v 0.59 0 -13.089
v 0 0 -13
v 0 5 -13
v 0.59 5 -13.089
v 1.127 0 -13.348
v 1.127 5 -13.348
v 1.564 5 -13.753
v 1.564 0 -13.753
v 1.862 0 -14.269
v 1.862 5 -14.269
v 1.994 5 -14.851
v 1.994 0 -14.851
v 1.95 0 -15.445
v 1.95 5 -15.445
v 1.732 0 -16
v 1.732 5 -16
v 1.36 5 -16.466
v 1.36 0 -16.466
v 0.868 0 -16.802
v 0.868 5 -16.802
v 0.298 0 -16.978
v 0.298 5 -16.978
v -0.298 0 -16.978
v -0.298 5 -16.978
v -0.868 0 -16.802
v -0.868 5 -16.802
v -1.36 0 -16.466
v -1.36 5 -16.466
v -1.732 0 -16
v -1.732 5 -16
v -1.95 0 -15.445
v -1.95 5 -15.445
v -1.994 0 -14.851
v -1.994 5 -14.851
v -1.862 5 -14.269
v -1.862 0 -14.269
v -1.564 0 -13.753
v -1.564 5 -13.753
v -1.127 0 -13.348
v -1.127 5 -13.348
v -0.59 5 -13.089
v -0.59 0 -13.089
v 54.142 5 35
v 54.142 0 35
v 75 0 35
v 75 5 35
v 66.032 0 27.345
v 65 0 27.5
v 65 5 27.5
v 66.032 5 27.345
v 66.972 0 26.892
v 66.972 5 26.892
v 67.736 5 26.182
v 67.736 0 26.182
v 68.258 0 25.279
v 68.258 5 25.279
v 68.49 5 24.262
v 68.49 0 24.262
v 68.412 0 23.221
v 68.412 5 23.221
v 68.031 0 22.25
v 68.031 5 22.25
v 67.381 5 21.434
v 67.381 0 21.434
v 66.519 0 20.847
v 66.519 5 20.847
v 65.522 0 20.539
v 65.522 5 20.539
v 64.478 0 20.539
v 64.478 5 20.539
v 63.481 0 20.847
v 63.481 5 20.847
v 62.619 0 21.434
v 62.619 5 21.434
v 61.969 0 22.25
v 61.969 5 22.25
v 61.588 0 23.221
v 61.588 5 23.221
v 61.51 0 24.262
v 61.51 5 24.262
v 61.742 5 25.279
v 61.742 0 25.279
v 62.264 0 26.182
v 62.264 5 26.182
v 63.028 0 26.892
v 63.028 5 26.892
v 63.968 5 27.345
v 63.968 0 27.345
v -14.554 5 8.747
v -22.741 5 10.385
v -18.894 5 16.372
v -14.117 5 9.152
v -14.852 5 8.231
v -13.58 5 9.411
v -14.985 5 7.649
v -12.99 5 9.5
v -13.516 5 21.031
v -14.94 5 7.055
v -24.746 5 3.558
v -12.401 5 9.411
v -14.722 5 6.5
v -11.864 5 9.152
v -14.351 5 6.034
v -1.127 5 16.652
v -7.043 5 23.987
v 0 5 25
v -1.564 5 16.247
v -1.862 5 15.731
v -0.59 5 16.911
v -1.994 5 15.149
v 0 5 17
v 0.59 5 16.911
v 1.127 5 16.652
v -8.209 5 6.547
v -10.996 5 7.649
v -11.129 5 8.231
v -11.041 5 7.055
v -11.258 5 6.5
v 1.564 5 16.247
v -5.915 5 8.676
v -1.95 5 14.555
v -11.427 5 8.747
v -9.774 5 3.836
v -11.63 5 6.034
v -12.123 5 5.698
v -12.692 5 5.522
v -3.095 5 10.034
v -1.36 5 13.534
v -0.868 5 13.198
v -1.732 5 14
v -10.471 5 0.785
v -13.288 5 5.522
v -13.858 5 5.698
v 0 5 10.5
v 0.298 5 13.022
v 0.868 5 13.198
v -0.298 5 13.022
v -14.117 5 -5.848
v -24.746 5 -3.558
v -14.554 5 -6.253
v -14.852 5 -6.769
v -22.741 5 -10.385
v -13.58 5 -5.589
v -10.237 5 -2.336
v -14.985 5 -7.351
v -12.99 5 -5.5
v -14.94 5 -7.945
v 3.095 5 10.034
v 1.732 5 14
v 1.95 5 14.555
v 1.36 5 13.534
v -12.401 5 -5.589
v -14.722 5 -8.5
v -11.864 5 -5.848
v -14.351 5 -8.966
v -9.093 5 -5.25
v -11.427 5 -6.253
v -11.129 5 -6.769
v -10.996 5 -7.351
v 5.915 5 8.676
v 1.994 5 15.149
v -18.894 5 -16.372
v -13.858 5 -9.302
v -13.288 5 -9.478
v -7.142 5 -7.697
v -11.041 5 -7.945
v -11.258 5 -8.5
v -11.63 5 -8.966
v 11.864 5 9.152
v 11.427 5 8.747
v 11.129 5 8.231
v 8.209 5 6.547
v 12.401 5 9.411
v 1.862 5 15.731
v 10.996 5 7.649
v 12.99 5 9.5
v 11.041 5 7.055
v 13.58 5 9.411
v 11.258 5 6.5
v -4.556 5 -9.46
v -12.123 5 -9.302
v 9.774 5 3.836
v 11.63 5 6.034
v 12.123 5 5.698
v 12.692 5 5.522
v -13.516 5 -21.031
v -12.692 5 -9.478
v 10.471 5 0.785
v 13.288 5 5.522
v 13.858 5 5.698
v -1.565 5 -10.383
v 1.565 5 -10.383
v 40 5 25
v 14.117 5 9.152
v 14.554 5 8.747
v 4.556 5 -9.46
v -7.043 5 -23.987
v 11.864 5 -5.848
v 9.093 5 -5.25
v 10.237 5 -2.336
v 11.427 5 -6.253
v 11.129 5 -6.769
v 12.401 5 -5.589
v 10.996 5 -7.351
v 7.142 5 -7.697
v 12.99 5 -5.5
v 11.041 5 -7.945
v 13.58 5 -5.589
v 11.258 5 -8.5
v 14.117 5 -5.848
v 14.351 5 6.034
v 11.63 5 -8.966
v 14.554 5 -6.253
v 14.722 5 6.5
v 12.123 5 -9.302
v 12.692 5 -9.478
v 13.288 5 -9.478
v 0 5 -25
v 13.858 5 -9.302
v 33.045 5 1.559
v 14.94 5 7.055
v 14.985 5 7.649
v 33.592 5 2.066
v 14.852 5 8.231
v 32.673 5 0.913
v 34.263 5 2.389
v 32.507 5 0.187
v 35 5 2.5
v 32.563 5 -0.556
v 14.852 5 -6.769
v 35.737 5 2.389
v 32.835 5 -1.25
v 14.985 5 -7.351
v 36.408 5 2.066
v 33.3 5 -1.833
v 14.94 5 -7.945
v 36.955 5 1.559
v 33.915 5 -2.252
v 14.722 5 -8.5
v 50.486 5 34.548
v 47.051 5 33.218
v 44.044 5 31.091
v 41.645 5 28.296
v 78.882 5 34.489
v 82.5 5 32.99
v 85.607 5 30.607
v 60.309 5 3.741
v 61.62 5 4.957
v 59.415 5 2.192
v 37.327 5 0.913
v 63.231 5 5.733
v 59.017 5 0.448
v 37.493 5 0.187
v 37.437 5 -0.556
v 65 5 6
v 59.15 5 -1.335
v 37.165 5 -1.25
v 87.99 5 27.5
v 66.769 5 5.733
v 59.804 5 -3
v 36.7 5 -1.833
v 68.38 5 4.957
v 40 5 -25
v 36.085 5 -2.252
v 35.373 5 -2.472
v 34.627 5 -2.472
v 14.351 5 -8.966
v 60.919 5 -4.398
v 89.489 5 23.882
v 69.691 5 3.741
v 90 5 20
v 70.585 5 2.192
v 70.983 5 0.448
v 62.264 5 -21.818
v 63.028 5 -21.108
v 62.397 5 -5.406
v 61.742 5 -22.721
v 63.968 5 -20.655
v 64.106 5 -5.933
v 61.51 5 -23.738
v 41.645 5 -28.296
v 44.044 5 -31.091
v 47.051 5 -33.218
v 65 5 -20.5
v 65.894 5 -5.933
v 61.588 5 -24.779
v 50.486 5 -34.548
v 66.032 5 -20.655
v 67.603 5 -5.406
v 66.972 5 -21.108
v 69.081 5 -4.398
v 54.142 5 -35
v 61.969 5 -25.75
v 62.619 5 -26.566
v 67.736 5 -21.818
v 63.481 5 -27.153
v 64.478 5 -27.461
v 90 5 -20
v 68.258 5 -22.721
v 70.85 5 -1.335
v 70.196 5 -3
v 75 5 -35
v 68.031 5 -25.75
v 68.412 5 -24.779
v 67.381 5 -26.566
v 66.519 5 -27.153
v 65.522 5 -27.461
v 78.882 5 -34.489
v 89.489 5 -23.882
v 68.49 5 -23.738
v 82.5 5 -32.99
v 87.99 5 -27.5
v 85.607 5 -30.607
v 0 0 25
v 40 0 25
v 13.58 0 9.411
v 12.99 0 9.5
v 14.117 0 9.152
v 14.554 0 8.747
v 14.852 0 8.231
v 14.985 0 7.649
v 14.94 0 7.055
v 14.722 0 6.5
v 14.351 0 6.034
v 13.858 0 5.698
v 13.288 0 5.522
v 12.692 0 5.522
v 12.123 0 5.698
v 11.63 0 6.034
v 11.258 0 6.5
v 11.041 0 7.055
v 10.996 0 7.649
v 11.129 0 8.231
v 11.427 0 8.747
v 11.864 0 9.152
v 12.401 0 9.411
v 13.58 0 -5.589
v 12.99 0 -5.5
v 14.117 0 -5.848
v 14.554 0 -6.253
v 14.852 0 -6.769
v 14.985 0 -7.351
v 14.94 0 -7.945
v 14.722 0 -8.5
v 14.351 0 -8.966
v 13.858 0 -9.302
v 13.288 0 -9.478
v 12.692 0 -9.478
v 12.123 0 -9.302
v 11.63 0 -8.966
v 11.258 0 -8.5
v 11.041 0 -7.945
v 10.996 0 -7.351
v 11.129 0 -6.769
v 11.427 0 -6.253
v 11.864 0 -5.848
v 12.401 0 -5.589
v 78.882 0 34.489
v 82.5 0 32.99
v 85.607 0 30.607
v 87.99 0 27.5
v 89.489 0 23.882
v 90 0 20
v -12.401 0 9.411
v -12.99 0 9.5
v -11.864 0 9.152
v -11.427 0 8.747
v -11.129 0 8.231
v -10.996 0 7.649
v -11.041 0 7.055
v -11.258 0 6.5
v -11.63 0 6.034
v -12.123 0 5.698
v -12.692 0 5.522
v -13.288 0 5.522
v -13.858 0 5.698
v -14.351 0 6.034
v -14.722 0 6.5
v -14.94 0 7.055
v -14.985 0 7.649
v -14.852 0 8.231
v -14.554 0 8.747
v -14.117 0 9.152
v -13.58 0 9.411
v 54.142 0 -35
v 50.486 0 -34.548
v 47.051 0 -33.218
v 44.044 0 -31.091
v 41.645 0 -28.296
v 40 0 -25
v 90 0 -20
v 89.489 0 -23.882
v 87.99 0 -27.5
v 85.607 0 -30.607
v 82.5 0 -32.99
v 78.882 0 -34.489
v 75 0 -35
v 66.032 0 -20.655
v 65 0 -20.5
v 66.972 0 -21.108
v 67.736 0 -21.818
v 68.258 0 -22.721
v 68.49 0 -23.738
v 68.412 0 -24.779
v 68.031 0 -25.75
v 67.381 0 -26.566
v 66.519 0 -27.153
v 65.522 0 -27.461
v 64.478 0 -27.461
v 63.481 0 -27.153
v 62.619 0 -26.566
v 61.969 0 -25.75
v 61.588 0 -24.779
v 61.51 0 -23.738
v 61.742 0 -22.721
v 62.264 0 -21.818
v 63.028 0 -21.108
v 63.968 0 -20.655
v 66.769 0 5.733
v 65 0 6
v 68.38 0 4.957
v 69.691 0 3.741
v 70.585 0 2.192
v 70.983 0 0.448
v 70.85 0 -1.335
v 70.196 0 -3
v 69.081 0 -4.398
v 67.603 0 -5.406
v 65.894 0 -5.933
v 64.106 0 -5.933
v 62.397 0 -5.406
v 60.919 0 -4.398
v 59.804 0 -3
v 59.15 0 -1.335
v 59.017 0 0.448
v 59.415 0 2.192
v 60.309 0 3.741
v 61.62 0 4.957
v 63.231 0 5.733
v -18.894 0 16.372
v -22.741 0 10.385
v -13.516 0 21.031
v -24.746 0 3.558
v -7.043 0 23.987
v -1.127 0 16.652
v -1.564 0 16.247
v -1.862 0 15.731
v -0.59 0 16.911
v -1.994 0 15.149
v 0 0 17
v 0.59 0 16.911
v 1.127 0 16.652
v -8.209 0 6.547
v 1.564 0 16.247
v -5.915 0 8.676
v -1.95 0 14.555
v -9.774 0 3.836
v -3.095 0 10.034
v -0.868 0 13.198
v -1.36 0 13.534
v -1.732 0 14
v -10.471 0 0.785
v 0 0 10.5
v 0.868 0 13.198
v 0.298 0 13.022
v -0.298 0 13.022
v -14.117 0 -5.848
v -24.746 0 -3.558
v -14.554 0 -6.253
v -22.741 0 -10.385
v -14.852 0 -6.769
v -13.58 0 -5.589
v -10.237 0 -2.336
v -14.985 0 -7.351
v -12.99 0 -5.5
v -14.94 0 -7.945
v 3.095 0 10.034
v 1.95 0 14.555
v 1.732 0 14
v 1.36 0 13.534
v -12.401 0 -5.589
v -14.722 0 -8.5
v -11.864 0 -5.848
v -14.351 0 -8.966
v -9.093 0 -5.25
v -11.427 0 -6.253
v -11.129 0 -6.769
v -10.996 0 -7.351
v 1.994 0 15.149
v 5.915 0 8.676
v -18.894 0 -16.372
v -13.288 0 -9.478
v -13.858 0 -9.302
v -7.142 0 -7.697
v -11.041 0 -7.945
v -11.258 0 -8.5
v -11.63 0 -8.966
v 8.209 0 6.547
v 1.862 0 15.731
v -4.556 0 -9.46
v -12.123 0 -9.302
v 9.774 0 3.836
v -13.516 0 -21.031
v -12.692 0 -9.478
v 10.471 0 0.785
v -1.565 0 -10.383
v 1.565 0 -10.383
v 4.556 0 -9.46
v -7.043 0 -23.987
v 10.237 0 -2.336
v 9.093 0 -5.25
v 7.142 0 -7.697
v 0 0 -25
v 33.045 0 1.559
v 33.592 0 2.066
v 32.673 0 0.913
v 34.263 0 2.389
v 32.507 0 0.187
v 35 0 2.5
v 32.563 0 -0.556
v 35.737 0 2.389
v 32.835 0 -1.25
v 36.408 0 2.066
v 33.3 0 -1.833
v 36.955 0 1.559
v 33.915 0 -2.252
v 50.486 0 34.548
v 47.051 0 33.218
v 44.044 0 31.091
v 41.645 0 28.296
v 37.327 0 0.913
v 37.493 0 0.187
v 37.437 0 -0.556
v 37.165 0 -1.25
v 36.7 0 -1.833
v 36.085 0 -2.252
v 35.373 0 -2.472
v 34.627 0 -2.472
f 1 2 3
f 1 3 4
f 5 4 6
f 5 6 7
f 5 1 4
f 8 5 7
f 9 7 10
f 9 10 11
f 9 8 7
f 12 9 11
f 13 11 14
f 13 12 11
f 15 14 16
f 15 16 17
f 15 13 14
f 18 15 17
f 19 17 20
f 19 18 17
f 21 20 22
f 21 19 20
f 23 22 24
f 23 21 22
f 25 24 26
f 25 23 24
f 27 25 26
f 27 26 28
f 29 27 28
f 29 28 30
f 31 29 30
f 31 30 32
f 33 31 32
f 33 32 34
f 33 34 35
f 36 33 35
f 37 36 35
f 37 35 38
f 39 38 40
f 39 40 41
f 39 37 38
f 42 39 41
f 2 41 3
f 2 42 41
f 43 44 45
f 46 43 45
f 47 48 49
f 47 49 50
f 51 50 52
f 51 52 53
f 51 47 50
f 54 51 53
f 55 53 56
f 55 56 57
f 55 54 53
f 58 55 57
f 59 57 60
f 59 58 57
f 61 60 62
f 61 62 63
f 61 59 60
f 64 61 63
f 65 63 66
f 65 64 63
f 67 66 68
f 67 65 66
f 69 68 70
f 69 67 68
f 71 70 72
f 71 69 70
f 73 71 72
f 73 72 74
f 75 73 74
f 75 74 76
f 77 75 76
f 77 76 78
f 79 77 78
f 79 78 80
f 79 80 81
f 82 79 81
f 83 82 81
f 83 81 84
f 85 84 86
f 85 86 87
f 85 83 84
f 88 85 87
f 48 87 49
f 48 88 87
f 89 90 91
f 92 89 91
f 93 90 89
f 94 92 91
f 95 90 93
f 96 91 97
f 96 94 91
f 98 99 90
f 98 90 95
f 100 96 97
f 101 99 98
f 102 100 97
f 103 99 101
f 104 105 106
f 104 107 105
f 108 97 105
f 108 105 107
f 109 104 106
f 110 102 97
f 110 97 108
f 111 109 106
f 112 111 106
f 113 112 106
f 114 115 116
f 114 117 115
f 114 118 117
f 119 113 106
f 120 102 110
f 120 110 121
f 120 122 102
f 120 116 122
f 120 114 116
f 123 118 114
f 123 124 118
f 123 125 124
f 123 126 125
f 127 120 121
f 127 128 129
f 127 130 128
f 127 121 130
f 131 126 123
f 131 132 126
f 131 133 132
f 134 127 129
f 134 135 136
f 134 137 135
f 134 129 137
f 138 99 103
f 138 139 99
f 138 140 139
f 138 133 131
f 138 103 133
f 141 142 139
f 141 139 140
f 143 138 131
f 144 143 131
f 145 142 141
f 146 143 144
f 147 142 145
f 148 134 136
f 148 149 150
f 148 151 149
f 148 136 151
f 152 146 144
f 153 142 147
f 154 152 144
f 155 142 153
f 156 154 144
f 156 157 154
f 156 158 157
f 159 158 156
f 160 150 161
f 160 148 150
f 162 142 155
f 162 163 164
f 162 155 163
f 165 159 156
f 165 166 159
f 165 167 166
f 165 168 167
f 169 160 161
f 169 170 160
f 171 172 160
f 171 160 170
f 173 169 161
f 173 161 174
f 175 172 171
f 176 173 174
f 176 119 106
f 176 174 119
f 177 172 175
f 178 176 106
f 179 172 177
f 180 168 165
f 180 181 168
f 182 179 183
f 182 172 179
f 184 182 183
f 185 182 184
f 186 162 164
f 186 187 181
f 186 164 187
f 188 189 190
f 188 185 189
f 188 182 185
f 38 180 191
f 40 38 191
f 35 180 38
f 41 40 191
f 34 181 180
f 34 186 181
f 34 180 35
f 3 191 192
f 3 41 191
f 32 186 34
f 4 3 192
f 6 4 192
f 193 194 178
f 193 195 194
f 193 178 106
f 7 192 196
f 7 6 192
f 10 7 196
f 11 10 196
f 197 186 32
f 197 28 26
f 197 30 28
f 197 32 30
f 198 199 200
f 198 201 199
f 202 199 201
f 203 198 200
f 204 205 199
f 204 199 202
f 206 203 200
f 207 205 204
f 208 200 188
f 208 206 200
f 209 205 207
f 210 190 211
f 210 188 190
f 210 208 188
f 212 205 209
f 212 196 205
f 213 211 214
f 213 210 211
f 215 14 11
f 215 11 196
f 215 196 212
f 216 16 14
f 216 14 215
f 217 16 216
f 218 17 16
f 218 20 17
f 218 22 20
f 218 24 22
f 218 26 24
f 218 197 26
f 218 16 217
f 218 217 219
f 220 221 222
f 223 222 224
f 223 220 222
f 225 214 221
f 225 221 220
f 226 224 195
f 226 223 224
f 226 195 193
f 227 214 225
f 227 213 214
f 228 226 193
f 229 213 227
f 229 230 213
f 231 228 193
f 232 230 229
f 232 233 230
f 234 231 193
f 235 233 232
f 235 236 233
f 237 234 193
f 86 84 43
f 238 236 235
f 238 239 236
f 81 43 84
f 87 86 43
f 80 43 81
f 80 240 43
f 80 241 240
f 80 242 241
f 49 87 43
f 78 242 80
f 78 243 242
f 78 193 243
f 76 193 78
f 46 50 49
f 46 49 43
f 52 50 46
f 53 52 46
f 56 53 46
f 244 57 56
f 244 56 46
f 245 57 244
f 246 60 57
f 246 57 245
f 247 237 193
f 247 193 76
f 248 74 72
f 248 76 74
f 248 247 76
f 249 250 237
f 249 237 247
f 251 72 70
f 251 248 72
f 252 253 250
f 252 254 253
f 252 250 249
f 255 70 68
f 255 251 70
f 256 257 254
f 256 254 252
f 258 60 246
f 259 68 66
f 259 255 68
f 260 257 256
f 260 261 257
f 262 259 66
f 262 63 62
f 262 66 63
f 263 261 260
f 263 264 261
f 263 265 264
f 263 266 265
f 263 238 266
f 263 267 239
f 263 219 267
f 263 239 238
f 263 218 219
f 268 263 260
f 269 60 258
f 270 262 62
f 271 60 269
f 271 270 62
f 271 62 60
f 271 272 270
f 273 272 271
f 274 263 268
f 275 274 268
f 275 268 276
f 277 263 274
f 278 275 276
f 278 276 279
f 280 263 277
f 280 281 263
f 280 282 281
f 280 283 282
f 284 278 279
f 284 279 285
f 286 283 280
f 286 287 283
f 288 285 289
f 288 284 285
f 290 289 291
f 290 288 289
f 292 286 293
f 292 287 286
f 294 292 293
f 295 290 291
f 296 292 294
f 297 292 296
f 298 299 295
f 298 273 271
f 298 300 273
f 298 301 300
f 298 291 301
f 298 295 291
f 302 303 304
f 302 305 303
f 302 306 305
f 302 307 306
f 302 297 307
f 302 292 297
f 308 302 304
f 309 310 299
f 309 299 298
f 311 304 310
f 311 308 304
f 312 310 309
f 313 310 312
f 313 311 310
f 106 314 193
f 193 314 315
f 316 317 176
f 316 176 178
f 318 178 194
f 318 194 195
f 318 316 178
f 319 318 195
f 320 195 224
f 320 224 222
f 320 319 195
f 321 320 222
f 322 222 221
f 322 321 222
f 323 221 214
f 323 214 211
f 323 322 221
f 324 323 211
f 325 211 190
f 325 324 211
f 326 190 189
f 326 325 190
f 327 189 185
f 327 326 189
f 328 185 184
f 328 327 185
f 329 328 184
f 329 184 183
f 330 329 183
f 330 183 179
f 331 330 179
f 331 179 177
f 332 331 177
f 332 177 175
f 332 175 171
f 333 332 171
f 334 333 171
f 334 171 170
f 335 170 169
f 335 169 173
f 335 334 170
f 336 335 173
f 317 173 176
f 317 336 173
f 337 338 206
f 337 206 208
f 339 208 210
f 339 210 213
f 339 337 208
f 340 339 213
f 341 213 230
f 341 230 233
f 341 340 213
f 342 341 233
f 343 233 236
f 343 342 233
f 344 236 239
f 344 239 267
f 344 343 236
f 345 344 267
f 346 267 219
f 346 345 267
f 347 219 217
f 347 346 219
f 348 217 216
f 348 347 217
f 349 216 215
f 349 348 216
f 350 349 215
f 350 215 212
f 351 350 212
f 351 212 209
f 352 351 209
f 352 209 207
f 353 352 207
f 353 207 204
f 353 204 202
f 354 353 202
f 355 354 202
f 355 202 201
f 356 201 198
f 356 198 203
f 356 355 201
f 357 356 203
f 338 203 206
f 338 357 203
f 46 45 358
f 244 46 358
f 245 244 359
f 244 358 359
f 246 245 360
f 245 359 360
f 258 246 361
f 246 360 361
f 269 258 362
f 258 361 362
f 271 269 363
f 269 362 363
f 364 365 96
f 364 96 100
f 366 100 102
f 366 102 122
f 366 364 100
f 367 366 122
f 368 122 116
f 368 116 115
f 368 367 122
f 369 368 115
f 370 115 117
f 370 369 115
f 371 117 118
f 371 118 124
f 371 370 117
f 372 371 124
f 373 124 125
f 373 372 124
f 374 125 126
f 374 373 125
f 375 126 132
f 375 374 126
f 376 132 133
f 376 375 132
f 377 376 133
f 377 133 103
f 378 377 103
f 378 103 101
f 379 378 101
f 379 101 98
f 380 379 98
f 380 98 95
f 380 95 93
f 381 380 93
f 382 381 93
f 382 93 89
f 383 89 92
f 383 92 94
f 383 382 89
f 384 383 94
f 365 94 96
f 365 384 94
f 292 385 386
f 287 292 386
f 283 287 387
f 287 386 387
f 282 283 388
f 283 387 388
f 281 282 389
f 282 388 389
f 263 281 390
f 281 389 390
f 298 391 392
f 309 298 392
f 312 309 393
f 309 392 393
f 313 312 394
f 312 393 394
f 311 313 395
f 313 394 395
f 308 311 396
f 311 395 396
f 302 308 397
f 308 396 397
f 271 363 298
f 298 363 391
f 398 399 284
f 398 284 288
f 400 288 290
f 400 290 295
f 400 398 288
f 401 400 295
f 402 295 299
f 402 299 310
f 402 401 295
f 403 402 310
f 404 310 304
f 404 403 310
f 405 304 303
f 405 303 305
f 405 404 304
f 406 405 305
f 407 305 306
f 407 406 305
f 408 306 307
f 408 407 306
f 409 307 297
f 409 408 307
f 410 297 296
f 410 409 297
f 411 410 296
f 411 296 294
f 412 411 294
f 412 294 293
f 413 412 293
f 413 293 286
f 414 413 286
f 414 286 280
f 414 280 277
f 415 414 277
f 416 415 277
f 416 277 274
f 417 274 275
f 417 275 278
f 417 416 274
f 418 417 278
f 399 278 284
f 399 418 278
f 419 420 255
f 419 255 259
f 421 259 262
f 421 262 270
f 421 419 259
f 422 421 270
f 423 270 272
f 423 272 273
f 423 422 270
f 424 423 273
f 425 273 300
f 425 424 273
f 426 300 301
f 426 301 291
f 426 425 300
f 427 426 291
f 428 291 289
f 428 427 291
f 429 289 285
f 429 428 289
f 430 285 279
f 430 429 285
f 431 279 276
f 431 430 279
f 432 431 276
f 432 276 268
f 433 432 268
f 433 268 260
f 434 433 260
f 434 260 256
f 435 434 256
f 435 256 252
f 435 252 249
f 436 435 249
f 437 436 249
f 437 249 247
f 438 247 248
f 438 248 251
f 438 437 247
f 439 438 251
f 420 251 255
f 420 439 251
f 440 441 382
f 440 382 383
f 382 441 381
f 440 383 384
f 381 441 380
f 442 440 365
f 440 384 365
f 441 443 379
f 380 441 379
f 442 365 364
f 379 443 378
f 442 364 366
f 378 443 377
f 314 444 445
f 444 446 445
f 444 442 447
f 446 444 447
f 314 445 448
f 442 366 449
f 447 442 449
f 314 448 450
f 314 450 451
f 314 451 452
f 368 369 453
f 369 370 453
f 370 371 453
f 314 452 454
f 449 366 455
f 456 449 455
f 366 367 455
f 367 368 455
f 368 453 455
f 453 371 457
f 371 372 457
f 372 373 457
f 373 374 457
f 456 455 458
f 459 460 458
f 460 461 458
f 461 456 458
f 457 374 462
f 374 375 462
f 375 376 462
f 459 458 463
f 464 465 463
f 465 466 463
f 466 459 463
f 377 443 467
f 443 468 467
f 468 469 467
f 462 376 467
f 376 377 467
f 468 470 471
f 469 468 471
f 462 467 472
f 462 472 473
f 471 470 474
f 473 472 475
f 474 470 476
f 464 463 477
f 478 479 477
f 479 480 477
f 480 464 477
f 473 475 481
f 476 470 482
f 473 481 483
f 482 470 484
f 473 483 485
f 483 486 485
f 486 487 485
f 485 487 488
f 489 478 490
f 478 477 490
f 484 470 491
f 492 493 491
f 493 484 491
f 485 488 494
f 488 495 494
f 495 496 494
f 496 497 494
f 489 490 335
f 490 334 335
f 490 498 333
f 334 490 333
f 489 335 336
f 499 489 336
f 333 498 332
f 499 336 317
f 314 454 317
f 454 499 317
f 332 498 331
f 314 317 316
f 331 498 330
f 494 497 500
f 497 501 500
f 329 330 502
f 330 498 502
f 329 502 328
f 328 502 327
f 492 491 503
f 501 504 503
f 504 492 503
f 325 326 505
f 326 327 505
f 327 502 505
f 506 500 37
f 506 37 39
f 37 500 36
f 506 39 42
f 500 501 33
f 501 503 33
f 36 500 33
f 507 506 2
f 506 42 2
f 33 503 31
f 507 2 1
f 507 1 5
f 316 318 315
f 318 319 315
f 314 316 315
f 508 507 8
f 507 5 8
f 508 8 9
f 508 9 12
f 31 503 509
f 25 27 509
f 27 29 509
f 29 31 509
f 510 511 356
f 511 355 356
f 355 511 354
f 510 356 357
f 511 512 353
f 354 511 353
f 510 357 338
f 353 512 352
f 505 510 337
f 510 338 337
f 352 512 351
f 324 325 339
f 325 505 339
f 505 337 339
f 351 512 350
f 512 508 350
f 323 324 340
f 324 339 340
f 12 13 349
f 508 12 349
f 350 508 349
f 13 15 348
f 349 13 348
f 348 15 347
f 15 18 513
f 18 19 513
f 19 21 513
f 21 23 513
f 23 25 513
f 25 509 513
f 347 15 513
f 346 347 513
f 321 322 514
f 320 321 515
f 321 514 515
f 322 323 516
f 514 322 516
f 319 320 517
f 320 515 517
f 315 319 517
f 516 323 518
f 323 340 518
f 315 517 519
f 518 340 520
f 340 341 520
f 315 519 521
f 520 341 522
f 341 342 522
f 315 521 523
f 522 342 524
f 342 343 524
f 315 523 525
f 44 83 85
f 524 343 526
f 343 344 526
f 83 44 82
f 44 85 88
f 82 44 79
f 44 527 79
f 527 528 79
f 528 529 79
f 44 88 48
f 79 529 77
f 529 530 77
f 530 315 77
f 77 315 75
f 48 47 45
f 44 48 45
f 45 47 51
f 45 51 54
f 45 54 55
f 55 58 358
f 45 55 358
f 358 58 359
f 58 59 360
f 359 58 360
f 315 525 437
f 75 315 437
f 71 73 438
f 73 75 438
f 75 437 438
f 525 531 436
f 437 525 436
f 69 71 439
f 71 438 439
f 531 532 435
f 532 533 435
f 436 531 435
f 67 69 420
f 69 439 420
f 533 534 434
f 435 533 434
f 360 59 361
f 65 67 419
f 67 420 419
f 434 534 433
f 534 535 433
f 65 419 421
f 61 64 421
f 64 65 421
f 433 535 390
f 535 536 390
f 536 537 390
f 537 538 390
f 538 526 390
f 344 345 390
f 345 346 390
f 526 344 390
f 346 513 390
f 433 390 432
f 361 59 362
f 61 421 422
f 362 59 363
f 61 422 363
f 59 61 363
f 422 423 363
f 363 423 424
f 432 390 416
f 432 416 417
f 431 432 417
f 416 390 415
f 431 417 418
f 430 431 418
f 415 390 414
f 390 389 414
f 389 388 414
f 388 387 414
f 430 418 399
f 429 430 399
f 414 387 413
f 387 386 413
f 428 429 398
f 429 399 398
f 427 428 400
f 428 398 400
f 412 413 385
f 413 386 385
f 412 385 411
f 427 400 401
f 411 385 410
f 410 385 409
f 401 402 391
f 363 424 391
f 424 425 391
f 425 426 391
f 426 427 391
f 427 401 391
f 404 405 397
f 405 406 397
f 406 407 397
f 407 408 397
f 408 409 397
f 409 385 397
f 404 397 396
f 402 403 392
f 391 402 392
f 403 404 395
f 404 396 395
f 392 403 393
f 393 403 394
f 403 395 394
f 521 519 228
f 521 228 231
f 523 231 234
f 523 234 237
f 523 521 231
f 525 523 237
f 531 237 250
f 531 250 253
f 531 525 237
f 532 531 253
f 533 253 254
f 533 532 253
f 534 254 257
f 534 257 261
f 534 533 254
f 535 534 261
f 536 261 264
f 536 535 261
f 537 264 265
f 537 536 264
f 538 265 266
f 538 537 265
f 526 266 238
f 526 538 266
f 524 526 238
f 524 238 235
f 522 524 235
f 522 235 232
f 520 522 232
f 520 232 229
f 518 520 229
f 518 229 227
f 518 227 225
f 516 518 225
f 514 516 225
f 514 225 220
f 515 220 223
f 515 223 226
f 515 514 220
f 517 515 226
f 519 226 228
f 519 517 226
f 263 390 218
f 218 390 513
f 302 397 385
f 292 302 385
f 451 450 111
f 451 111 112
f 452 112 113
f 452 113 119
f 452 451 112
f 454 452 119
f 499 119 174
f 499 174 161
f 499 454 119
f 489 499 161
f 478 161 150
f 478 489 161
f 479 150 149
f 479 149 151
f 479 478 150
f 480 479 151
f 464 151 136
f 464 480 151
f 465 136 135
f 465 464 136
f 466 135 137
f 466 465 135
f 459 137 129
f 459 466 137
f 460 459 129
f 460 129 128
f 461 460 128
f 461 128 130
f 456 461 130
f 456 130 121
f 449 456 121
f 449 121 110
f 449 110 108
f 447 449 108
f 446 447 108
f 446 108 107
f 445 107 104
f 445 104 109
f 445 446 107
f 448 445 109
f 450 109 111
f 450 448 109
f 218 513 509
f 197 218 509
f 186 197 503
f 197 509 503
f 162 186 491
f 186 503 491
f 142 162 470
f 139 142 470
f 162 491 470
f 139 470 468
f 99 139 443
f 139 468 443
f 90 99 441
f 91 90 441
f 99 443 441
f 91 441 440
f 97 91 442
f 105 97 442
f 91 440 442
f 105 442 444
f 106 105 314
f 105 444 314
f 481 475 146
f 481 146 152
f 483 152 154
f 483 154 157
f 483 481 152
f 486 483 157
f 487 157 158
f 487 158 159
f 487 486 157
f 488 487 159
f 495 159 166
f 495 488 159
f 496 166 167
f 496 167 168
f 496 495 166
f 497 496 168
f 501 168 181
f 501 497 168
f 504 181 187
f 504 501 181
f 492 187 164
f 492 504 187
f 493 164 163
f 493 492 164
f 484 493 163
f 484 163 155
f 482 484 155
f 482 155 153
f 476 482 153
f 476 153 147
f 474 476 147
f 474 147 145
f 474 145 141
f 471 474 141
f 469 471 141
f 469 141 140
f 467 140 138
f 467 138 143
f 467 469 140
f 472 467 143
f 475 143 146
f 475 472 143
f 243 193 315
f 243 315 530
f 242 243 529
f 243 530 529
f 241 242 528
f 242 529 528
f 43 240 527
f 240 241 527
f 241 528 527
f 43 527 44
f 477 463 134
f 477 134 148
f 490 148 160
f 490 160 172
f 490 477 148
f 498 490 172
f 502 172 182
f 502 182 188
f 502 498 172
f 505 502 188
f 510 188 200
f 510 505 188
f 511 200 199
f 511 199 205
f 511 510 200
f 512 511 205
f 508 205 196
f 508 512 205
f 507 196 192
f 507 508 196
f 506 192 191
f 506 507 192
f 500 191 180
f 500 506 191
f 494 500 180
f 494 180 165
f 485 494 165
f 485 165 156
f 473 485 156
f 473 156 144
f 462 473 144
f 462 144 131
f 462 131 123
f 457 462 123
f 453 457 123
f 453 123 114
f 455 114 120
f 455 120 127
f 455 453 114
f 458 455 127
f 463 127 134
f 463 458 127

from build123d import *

# Parameters (mm, degrees)
SKETCH1_R           = 3.5
SKETCH1_R_2         = 6
SKETCH1_R_3         = 2.5
SKETCH1_R_4         = 2
SKETCH1_R_5         = 10.5
BOSS_EXTRUDE1_DEPTH = 5
FILLET2_R           = 15


with BuildPart() as part:
    # Sketch1 → Boss-Extrude1 (new body)
    with BuildSketch(Plane(origin=(0, 0, 0), x_dir=(1, 0, 0), z_dir=(0, 1, 0))):
        with BuildLine():
            Line((40, -25), (40, -35))
            Line((40, -35), (90, -35))
            Line((90, -35), (90, 35))
            Line((90, 35), (40, 35))
            Line((40, 35), (40, 25))
            Line((40, 25), (0, 25))
            ThreePointArc((0, 25), (-25, 0), (0, -25))
            Line((0, -25), (40, -25))
        make_face()
        with Locations(Location((65, 24, 0), (0, 0, 270))):
            Circle(SKETCH1_R, mode=Mode.SUBTRACT)
        with Locations(Location((65, -24, 0), (0, 0, 270))):
            Circle(SKETCH1_R, mode=Mode.SUBTRACT)
        with Locations(Location((65, 0, 0), (0, 0, 270))):
            Circle(SKETCH1_R_2, mode=Mode.SUBTRACT)
        with Locations(Location((35, 0, 0), (0, 0, 270))):
            Circle(SKETCH1_R_3, mode=Mode.SUBTRACT)
        with Locations(Location((0, -15, 0), (0, 0, 270))):
            Circle(SKETCH1_R_4, mode=Mode.SUBTRACT)
        with Locations(Location((-12.990381057, -7.5, 0), (0, 0, 270))):
            Circle(SKETCH1_R_4, mode=Mode.SUBTRACT)
        with Locations(Location((12.990381057, -7.5, 0), (0, 0, 270))):
            Circle(SKETCH1_R_4, mode=Mode.SUBTRACT)
        with Locations(Location((-12.990381057, 7.5, 0), (0, 0, 270))):
            Circle(SKETCH1_R_4, mode=Mode.SUBTRACT)
        with Locations(Location((0, 0, 0), (0, 0, 270))):
            Circle(SKETCH1_R_5, mode=Mode.SUBTRACT)
        with Locations(Location((0, 15, 0), (0, 0, 270))):
            Circle(SKETCH1_R_4, mode=Mode.SUBTRACT)
        with Locations(Location((12.990381057, 7.5, 0), (0, 0, 270))):
            Circle(SKETCH1_R_4, mode=Mode.SUBTRACT)
    extrude(amount=BOSS_EXTRUDE1_DEPTH)

    # Fillet2
    # the kernel refuses this fillet: 15 mm, written as the material it takes off along each edge
    with BuildSketch(Plane(origin=(40, -35.355339059, -35), x_dir=(1, 0, 0), z_dir=(0, 1, 0))) as fillet2_piece_1:
        with BuildLine():
            CenterArc((14.142135624, -15), FILLET2_R, 90, 70.528779366)
            Line((0, -10), (-0.282842712, -9.9))
            ThreePointArc((-0.282842712, -9.9), (-0.3, -5), (-0.3, 0))
            Line((-0.3, 0), (0, 0.3))
            Line((0, 0.3), (14.142135624, 0.3))
            Line((14.142135624, 0.3), (14.142135624, 0))
        make_face()
    extrude(amount=75.710678119, mode=Mode.SUBTRACT)
    with BuildSketch(Plane(origin=(90, -37.5, 35), x_dir=(-1, 0, 0), z_dir=(0, 1, 0)), Plane(origin=(90, -37.5, -35), x_dir=(0, 0, 1), z_dir=(0, 1, 0))) as fillet2_piece_2:
        with BuildLine():
            CenterArc((FILLET2_R, -FILLET2_R), FILLET2_R, 90, 90)
            Line((0, -FILLET2_R), (-FILLET2_R * 0.02, -FILLET2_R))
            Line((-FILLET2_R * 0.02, -FILLET2_R), (-FILLET2_R * 0.02, FILLET2_R * 0.02))
            Line((-FILLET2_R * 0.02, FILLET2_R * 0.02), (FILLET2_R, FILLET2_R * 0.02))
            Line((FILLET2_R, FILLET2_R * 0.02), (FILLET2_R, 0))
        make_face()
    extrude(amount=80, mode=Mode.SUBTRACT)
    with BuildSketch(Plane(origin=(40, -35.355339059, 35), x_dir=(0, 0, -1), z_dir=(0, 1, 0))) as fillet2_piece_3:
        with BuildLine():
            CenterArc((15, -14.142135624), FILLET2_R, 109.471220634, 70.528779366)
            Line((0, -14.142135624), (-0.3, -14.142135624))
            Line((-0.3, -14.142135624), (-0.3, 0))
            Line((-0.3, 0), (0, 0.3))
            ThreePointArc((0, 0.3), (5, 0.3), (9.9, 0.282842712))
            Line((9.9, 0.282842712), (10, 0))
        make_face()
    extrude(amount=75.710678119, mode=Mode.SUBTRACT)


solid = part.part
